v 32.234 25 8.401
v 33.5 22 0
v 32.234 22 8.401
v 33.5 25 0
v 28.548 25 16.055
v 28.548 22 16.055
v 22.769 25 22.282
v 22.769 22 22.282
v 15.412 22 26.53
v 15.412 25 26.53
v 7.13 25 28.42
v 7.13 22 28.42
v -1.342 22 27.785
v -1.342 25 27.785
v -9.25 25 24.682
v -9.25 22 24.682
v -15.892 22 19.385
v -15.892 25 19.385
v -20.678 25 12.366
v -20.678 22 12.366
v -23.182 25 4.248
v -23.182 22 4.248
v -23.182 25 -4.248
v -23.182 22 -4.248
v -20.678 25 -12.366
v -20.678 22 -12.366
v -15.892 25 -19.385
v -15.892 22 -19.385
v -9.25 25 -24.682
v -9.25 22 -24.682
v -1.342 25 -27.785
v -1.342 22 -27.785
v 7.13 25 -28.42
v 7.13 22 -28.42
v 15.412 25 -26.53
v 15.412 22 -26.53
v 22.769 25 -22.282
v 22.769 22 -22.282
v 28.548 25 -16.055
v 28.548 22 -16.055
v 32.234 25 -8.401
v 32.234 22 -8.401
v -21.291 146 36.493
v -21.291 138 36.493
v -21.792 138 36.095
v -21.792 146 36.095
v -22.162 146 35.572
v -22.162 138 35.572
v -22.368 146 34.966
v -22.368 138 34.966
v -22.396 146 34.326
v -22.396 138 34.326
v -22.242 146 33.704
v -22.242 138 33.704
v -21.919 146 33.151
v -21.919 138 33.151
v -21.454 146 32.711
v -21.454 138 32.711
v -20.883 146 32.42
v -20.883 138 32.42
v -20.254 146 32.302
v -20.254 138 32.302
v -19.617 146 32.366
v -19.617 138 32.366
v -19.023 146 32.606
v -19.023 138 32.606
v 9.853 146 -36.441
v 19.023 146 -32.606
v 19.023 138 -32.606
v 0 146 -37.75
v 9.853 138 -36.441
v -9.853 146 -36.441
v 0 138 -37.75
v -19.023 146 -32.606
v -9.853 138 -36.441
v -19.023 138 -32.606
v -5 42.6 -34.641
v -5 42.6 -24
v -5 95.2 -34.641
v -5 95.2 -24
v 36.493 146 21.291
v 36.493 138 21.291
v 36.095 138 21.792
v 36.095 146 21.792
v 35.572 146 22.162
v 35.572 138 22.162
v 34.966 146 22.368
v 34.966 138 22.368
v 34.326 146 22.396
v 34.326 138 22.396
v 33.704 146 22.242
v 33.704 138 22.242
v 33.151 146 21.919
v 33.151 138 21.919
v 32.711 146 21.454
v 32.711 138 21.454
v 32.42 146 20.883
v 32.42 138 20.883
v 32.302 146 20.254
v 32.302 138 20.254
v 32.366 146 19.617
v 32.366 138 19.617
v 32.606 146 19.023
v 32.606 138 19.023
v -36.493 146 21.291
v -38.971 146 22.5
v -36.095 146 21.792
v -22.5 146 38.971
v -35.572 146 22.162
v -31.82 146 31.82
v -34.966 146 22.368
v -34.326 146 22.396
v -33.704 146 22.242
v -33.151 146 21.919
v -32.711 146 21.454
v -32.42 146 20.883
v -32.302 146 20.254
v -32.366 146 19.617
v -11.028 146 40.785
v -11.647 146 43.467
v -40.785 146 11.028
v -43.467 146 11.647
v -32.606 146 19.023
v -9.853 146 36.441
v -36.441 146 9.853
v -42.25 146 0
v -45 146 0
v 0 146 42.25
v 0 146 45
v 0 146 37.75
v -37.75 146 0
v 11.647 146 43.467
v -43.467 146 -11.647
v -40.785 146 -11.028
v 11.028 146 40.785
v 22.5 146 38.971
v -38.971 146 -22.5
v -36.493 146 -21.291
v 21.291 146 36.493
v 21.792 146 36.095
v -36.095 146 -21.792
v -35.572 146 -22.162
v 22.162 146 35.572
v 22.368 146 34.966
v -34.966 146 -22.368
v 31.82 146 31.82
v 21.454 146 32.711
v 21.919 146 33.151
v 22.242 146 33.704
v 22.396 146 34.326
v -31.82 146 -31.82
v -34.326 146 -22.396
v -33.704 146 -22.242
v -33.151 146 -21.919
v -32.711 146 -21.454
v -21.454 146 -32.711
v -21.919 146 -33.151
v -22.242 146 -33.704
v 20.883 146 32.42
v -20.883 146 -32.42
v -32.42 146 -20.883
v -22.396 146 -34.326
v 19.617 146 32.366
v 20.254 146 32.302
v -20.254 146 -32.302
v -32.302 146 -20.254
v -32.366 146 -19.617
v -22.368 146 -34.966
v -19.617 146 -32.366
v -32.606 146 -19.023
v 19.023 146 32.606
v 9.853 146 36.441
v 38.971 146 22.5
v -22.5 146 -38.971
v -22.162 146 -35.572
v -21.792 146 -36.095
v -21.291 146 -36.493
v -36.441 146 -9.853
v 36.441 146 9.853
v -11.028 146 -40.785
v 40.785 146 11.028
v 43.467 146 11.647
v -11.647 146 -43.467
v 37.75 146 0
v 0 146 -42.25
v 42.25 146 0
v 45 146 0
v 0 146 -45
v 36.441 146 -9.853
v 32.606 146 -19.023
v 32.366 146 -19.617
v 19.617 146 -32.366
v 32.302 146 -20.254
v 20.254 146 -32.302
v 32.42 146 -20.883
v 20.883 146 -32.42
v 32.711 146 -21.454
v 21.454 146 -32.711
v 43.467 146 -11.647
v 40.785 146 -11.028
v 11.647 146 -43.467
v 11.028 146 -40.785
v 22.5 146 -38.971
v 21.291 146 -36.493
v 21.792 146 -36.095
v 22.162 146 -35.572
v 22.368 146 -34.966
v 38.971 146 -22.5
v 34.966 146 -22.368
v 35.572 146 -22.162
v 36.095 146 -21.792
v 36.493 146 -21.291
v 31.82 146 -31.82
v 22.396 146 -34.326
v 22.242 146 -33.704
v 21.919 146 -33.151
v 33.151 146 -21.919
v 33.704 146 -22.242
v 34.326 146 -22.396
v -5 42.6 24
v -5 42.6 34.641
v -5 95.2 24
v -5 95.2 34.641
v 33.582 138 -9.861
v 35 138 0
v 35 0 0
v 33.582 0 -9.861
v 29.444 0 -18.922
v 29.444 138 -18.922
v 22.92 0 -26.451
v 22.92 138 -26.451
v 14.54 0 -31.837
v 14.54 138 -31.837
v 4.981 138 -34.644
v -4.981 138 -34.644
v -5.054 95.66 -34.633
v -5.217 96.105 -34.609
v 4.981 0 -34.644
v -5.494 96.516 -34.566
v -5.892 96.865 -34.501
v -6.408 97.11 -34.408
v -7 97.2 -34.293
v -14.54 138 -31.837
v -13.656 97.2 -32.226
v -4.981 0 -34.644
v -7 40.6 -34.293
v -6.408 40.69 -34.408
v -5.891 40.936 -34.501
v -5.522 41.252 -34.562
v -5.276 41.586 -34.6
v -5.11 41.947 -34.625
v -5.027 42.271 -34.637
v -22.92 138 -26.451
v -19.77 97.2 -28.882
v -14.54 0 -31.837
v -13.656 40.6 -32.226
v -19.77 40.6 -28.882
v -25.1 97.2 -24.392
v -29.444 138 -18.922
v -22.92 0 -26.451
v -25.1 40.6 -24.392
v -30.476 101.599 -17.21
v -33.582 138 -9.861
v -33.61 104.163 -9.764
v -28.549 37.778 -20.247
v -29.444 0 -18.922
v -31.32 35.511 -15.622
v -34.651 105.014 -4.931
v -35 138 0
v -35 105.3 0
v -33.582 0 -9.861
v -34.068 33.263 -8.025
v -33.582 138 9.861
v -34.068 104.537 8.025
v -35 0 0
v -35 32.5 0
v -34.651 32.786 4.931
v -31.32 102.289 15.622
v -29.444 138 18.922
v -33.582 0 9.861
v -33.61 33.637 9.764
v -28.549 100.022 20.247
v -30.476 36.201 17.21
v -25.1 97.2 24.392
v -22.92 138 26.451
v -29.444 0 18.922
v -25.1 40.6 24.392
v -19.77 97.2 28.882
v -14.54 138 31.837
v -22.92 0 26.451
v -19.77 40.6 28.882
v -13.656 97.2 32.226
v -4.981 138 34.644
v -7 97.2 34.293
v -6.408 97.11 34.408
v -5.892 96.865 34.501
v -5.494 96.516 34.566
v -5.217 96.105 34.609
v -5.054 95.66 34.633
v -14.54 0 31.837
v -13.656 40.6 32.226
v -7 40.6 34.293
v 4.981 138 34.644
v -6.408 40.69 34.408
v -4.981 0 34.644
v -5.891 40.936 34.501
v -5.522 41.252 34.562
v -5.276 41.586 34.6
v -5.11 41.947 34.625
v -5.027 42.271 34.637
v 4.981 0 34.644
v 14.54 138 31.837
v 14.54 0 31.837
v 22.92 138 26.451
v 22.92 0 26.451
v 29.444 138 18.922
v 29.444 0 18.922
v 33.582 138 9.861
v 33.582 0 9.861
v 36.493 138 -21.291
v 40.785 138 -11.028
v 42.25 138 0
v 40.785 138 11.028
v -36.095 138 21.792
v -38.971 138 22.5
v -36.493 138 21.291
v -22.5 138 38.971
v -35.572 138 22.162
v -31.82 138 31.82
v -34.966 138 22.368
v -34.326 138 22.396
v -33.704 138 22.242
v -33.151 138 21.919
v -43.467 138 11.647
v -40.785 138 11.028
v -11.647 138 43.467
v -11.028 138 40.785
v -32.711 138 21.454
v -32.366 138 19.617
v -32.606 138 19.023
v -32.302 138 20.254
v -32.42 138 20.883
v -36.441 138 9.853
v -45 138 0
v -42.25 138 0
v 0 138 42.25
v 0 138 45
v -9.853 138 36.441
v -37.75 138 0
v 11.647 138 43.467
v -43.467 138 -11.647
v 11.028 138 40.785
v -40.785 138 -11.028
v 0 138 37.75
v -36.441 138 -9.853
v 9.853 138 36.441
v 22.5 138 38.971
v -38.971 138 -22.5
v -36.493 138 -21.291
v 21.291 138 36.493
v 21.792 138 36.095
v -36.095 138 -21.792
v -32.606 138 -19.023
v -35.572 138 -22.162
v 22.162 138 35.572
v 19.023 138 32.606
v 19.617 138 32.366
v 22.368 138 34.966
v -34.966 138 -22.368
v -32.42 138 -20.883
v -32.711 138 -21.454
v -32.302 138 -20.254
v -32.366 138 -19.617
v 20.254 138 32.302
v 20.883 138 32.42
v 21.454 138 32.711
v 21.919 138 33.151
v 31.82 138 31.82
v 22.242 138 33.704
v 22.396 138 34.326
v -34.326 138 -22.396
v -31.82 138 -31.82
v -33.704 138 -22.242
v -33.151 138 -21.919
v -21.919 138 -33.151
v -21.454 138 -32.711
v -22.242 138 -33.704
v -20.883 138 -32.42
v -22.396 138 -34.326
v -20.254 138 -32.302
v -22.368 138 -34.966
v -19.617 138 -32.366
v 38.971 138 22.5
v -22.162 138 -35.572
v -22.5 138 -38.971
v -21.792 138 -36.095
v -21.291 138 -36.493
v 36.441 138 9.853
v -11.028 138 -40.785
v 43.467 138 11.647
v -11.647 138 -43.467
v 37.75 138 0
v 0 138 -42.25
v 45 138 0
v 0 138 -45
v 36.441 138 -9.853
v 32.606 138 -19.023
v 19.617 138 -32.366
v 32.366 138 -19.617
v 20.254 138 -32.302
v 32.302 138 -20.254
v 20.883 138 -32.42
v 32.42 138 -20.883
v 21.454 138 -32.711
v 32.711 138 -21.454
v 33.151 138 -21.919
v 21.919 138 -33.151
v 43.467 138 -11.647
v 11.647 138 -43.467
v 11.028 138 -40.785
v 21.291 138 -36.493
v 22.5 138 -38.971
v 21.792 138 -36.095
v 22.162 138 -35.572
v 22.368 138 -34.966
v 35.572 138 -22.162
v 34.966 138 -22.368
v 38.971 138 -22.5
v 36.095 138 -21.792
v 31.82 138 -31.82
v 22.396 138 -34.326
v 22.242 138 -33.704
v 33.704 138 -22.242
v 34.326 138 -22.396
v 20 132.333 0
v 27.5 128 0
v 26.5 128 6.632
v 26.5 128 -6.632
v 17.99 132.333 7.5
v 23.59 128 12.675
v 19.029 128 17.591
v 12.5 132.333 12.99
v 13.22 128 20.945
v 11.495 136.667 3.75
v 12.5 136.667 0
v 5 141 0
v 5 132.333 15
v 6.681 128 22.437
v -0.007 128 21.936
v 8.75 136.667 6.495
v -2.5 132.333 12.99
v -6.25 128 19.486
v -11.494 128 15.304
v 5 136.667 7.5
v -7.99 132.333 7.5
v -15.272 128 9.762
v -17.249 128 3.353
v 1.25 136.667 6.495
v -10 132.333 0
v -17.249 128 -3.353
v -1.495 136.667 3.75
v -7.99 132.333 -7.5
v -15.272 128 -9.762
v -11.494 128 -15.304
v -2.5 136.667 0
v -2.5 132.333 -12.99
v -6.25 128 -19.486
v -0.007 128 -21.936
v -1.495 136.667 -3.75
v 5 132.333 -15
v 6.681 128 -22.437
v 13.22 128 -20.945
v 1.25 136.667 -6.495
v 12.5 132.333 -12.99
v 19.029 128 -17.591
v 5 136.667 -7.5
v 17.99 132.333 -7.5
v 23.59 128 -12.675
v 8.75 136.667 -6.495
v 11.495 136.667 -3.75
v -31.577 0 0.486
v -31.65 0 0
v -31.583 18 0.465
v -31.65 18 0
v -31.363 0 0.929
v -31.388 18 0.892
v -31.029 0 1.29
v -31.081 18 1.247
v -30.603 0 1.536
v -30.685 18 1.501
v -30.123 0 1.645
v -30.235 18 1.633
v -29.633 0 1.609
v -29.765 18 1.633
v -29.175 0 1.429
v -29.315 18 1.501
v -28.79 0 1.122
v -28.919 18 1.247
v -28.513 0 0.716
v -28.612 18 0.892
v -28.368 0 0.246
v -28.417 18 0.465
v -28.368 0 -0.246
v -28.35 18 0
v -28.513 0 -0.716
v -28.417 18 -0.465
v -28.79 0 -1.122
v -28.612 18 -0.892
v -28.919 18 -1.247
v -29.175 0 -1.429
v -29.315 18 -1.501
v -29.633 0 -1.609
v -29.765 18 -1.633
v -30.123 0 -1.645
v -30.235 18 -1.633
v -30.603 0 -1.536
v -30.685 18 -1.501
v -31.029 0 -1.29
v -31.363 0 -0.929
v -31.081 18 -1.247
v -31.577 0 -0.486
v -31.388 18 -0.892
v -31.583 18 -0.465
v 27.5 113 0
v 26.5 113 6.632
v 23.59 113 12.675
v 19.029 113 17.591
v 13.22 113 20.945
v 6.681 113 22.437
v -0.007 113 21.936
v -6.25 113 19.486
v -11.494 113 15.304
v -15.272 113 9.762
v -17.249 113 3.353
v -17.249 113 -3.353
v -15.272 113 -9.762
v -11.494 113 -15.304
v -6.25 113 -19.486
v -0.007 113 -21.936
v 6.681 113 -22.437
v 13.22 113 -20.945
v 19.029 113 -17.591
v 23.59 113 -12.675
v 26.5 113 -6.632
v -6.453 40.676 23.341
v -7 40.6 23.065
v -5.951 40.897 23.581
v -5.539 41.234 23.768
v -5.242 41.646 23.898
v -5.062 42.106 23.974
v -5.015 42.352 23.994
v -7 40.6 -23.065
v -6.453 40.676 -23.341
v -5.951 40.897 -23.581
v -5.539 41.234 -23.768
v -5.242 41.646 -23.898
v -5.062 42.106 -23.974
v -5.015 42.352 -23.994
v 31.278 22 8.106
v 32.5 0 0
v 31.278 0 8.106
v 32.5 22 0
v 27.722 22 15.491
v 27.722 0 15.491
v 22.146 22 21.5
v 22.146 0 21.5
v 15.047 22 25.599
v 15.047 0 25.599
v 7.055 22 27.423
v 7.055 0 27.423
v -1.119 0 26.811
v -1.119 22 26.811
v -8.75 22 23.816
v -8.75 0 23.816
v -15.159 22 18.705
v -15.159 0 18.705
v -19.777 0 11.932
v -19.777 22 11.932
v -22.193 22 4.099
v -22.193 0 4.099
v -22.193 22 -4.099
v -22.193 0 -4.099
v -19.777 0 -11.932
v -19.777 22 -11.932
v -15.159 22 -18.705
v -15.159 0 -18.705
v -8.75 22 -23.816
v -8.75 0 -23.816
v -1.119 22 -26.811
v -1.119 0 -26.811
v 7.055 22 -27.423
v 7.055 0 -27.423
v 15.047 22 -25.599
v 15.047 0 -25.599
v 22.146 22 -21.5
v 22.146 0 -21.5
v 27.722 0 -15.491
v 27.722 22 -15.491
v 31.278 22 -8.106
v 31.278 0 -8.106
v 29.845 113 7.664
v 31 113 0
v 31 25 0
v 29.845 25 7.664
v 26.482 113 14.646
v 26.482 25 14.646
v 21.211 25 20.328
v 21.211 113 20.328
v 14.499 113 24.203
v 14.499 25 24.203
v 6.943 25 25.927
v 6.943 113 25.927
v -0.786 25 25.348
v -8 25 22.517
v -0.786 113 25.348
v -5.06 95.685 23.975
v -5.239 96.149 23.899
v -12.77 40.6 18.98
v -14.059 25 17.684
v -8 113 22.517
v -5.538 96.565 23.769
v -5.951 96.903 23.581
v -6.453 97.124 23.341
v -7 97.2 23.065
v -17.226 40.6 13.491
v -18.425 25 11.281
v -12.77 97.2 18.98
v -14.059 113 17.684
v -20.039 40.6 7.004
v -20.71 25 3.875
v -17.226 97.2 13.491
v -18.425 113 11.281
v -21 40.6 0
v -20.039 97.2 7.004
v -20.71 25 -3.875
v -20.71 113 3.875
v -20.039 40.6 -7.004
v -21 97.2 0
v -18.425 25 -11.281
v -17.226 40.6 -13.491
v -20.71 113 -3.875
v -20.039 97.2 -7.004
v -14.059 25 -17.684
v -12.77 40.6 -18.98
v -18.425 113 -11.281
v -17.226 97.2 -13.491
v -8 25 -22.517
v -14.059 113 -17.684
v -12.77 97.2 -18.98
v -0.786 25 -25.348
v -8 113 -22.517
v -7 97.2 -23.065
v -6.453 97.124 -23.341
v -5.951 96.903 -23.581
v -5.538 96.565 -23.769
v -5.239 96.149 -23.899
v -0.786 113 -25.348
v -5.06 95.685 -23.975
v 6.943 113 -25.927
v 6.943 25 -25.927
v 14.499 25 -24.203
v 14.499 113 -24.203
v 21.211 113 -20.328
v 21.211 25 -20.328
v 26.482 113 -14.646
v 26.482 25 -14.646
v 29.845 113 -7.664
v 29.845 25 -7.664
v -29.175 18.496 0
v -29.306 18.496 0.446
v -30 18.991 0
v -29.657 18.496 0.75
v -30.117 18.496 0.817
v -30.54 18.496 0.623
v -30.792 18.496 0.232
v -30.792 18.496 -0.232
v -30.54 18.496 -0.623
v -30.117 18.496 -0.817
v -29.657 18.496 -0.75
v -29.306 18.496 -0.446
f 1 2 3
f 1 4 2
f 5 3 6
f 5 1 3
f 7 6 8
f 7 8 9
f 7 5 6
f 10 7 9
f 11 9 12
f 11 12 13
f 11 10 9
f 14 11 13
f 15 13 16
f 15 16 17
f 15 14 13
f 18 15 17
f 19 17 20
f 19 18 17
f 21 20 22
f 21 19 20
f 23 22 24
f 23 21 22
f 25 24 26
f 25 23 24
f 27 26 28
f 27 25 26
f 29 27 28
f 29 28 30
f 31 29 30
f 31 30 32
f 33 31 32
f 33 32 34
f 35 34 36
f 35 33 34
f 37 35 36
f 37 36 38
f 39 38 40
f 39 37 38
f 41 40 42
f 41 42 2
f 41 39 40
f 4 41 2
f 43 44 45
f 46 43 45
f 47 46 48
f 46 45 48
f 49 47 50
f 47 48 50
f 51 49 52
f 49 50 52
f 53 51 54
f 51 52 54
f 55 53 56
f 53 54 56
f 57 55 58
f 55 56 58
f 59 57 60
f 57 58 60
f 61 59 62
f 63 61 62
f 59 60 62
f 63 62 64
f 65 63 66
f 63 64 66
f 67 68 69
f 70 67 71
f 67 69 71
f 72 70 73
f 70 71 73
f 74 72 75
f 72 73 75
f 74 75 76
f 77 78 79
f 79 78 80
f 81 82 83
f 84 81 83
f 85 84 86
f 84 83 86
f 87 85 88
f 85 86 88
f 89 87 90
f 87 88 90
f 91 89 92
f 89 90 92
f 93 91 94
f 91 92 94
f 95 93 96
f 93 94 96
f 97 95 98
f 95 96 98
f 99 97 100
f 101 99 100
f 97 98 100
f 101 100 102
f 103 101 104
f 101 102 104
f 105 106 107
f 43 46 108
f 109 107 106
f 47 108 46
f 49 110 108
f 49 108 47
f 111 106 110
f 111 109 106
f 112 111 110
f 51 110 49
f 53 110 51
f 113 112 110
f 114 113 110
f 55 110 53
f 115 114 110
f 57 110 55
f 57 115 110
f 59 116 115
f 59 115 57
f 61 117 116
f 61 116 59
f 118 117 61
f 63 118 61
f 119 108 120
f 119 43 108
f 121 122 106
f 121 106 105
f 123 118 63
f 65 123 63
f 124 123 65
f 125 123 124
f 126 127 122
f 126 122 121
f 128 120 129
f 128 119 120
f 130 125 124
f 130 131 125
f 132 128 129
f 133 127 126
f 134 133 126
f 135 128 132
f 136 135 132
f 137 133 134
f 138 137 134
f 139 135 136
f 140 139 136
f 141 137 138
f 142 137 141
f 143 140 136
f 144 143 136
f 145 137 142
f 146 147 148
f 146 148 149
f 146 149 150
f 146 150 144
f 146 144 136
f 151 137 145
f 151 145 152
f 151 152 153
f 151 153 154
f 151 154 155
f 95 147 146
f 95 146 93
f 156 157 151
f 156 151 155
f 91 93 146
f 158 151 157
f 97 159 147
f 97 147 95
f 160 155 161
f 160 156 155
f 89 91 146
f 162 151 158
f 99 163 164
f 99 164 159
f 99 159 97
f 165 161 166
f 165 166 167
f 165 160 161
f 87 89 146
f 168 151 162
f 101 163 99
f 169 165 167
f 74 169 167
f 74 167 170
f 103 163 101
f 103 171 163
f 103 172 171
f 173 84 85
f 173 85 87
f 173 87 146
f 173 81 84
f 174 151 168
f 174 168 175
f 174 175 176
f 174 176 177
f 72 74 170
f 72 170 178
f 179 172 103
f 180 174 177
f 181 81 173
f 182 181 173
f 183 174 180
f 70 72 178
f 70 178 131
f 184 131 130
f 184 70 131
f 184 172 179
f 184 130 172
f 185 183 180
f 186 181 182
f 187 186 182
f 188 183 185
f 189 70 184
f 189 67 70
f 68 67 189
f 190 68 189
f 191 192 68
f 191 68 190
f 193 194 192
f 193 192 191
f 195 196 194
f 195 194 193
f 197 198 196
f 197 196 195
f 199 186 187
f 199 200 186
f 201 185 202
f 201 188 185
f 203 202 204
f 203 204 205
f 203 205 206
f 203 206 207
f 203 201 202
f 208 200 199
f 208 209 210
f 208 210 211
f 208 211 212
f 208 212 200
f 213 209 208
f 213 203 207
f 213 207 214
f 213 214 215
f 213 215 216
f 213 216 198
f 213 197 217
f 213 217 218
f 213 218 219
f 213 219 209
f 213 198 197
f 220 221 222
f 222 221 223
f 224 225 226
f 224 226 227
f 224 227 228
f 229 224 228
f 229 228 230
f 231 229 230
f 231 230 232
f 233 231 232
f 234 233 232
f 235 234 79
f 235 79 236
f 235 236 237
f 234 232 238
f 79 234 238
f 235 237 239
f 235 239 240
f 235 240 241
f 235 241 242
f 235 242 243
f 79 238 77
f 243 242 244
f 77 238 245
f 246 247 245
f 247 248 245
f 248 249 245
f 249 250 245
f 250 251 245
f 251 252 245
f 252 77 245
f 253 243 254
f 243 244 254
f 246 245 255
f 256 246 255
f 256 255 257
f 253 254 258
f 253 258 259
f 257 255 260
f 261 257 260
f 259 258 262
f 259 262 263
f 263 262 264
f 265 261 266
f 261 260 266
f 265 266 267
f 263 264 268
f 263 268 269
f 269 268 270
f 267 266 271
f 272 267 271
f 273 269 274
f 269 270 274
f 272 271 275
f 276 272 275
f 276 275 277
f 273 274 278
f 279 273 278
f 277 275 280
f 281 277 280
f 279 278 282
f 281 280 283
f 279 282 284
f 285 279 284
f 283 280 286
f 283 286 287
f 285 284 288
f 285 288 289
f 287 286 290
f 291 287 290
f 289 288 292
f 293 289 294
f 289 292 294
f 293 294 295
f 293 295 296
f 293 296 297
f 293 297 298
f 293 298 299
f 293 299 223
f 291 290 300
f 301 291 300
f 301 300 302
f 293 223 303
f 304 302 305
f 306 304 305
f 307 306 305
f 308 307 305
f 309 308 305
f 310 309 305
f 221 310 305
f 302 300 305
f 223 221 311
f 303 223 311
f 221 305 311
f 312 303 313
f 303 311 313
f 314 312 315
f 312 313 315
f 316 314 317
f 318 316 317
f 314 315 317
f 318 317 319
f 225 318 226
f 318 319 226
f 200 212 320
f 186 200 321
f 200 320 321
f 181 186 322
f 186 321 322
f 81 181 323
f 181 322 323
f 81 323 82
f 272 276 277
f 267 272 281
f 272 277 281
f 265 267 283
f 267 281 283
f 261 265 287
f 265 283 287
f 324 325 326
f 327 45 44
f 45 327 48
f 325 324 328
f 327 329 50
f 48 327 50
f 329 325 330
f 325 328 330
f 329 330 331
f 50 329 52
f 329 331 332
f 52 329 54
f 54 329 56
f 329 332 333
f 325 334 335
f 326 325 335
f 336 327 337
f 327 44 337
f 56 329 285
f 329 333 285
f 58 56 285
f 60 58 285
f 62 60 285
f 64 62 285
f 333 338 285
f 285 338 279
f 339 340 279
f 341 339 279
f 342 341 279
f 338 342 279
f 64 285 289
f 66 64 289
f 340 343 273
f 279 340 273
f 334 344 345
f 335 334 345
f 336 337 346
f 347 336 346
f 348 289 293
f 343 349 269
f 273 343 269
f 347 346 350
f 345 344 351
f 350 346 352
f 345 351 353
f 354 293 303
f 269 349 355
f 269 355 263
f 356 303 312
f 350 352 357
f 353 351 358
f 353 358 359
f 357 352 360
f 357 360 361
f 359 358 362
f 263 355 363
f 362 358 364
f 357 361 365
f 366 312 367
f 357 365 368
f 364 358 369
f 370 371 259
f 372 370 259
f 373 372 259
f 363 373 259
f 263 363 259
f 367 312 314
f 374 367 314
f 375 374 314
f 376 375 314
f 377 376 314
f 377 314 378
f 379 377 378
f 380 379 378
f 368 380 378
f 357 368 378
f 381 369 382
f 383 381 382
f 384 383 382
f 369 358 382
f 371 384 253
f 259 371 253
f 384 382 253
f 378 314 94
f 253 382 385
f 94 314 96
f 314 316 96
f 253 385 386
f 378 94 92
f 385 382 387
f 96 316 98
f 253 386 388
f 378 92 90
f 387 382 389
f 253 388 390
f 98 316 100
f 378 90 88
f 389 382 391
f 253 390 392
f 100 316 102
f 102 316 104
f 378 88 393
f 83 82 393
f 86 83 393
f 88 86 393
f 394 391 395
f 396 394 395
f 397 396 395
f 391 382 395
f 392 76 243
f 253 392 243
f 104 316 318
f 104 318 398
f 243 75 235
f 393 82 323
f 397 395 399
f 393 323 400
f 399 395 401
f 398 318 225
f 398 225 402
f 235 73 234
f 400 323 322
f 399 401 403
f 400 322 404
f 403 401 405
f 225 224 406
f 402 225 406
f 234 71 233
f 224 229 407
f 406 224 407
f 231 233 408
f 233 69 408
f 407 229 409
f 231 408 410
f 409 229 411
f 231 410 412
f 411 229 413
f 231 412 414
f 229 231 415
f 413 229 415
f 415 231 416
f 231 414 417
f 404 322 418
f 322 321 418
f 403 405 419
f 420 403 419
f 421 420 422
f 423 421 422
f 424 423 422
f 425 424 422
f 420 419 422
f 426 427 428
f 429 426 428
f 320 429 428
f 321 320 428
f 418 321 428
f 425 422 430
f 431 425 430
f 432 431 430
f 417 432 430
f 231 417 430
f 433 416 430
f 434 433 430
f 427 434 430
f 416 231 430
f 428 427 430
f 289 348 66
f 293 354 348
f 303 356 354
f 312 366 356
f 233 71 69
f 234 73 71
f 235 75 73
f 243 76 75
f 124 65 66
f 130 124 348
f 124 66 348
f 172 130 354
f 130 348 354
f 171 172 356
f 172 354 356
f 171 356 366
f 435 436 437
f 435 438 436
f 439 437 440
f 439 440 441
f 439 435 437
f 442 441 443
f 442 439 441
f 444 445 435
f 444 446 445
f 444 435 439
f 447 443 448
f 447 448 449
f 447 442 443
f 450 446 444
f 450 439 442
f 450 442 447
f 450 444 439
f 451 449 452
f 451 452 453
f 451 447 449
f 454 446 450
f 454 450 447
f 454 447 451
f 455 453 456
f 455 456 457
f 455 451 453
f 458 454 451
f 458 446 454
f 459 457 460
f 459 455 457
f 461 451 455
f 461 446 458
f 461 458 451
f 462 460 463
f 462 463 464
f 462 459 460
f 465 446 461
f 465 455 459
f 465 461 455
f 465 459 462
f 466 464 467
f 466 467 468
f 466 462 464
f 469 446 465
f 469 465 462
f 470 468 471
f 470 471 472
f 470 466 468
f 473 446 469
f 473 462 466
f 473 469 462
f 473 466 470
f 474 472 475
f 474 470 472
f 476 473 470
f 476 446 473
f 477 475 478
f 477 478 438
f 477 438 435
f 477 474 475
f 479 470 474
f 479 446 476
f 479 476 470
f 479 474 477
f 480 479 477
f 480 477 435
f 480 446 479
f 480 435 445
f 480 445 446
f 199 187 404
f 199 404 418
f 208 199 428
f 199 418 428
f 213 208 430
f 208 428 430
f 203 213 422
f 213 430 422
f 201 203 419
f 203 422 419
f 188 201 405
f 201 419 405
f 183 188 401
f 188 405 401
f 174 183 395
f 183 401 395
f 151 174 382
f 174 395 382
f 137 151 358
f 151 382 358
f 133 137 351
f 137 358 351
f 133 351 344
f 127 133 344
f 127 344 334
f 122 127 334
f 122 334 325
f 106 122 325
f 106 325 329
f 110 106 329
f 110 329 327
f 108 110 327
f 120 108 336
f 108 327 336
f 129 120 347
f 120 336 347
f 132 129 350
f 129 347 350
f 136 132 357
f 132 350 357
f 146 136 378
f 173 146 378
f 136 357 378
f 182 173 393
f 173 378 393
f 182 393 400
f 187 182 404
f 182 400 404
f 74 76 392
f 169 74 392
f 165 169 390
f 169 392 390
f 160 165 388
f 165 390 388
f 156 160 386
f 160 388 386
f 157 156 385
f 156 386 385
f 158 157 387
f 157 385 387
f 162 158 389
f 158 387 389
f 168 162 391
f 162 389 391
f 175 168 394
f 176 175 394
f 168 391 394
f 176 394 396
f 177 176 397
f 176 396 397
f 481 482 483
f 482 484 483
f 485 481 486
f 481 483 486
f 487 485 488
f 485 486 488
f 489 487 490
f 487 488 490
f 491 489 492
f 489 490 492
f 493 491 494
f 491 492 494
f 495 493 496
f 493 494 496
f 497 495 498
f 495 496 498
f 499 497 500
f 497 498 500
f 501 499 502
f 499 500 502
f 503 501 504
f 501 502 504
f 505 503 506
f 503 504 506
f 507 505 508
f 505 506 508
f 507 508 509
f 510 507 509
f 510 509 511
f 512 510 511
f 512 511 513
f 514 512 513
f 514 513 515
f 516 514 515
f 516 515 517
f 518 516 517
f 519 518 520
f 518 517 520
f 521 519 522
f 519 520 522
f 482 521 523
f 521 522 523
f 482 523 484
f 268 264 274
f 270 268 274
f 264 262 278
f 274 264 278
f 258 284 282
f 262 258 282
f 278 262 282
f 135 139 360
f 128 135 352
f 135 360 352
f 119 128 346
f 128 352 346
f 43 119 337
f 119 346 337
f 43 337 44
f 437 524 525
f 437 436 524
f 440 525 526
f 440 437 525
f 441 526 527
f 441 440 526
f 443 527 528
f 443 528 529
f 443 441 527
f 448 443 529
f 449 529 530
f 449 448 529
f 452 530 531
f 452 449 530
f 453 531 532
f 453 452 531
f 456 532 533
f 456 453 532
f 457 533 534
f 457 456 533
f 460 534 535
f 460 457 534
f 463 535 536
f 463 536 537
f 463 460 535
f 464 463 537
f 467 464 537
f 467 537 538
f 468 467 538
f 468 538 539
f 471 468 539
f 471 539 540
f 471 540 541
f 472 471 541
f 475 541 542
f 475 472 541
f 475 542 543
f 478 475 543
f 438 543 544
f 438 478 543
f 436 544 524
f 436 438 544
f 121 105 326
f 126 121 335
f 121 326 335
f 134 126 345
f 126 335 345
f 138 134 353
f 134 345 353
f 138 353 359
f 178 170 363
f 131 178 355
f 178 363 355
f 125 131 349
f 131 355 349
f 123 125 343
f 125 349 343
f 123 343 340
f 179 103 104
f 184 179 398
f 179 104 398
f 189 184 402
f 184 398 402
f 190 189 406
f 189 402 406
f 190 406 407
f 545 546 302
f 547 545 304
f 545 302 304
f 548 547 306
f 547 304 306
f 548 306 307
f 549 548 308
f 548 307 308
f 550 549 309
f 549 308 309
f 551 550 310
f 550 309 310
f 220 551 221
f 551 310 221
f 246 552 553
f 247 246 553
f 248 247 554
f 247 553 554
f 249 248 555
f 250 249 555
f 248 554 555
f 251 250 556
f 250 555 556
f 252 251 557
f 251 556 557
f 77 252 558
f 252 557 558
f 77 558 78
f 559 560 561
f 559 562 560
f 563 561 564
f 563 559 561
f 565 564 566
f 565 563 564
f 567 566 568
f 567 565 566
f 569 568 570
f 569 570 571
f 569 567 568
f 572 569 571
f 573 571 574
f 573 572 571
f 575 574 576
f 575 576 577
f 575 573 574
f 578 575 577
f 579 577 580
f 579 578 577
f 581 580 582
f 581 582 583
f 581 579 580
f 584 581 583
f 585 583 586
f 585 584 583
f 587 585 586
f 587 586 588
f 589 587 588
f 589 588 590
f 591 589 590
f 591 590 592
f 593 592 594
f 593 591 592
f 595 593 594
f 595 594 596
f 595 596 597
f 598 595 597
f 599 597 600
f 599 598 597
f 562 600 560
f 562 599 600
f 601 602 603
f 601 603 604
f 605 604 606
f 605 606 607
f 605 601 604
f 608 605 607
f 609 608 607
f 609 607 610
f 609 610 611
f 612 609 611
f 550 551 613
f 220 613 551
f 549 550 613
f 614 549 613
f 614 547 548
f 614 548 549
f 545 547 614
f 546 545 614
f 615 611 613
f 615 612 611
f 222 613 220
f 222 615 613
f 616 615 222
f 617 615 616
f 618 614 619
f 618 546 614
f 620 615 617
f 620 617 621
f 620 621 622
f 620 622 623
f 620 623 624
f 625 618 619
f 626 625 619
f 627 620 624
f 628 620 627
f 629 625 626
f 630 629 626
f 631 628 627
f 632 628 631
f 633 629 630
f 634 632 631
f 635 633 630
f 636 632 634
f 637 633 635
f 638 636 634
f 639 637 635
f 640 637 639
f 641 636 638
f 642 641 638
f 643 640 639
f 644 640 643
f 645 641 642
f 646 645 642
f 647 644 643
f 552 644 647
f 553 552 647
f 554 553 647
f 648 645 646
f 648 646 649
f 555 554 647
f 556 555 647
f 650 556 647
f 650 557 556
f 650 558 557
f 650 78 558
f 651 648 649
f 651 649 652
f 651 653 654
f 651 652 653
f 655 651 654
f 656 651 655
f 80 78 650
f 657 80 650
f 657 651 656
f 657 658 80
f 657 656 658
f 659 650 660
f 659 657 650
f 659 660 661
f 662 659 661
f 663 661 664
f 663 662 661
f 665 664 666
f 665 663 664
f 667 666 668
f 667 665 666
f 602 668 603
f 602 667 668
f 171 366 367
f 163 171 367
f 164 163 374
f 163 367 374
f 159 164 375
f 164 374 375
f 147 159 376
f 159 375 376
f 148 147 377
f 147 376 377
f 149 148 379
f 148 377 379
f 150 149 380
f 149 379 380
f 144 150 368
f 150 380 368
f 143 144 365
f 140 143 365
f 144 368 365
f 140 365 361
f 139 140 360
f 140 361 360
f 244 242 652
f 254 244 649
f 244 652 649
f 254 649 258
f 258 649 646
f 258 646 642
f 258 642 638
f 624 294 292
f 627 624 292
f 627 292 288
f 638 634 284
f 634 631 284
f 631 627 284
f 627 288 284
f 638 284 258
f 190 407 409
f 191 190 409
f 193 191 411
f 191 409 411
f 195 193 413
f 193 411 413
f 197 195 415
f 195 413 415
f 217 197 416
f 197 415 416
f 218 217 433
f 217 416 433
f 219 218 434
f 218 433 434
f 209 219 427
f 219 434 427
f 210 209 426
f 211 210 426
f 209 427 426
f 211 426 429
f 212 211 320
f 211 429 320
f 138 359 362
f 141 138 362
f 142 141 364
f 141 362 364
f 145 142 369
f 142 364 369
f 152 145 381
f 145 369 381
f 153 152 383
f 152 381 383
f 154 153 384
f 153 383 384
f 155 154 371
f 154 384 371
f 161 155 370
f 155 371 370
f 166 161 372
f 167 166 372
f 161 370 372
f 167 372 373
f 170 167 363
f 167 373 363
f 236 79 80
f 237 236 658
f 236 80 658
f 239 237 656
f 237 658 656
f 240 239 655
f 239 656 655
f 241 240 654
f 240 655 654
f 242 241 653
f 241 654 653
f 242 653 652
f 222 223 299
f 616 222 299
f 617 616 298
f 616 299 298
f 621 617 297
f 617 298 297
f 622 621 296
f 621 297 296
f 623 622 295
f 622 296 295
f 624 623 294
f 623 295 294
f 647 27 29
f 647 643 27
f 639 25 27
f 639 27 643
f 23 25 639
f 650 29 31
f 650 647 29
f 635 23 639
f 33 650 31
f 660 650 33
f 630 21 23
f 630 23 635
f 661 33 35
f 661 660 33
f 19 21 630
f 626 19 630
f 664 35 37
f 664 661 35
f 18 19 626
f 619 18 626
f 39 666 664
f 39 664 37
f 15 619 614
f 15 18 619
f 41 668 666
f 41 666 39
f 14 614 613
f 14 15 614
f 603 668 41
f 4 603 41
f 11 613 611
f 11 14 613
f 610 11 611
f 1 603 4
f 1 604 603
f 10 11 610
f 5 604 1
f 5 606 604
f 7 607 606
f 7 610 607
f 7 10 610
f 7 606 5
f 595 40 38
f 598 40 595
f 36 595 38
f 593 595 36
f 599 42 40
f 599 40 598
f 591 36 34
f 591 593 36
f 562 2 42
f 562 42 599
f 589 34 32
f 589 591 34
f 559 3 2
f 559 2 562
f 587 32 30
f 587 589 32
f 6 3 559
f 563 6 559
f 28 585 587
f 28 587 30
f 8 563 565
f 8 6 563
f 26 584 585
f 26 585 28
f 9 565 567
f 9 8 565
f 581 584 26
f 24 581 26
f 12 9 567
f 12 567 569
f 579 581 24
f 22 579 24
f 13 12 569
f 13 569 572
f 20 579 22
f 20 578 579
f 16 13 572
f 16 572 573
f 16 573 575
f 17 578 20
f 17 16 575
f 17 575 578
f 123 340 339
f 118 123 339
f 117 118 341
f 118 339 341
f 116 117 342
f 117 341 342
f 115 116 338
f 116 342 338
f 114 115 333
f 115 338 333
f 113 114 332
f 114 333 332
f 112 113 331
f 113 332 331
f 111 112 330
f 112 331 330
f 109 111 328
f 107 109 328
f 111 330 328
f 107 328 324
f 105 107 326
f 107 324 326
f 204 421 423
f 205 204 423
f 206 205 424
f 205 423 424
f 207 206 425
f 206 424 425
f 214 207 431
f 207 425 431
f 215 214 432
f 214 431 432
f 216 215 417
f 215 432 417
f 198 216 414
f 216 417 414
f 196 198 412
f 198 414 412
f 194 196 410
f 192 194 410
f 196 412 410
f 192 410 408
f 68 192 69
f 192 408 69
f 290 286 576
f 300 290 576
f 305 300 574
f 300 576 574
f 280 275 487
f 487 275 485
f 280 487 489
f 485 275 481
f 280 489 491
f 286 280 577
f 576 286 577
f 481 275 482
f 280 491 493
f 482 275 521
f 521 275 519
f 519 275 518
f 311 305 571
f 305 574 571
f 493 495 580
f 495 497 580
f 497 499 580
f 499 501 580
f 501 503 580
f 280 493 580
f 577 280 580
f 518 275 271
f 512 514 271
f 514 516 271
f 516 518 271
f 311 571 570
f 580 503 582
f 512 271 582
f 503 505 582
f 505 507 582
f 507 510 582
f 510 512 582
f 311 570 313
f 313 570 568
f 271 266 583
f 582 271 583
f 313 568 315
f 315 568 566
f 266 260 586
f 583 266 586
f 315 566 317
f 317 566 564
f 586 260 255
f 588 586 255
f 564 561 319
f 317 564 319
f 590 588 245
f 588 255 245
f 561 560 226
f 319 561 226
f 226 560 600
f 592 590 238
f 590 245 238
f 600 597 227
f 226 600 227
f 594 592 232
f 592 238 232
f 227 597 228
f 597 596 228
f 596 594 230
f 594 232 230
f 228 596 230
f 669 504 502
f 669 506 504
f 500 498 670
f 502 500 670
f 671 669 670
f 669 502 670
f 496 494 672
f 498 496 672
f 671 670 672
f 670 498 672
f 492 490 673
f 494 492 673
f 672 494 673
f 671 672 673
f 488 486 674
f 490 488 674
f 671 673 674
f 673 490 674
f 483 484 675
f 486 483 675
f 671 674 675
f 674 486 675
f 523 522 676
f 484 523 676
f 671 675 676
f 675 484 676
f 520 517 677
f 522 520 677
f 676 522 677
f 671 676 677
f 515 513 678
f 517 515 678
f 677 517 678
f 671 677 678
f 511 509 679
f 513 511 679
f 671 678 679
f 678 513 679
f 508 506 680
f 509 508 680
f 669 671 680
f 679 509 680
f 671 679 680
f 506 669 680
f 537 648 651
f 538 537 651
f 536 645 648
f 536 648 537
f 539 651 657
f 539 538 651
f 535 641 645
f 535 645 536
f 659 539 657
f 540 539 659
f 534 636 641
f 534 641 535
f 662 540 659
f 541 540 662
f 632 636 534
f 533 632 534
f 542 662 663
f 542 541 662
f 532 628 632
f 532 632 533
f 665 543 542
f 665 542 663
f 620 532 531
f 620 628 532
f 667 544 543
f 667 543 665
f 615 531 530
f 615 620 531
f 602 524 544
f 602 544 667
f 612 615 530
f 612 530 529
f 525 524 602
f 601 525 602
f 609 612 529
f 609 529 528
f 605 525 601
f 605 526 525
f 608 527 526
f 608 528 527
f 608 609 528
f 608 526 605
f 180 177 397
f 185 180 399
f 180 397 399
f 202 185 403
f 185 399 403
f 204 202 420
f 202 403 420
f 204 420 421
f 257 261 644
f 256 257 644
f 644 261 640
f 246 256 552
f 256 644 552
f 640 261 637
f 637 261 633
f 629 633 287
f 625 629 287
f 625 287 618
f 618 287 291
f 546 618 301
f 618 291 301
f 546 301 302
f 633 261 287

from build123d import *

# Parameters (mm, degrees)
CROQUIS1_R                = 35
SALIENTE_EXTRUIR1_DEPTH   = 138
CROQUIS2_R                = 45
SALIENTE_EXTRUIR2_DEPTH   = 8
CORTAR_EXTRUIR1_DEPTH     = 83.5
CORTAR_EXTRUIR2_DEPTH     = 167
TALADRO_ROSCADO_M41_D     = 3.3
TALADRO_ROSCADO_M41_DEPTH = 18
TALADRO_ROSCADO_M41_TIP   = 0.991420021


with BuildPart() as part:
    # Croquis1 → Saliente-Extruir1 (new body)
    with BuildSketch(Plane(origin=(0, 0, 0), x_dir=(1, 0, 0), z_dir=(0, 1, 0))):
        Circle(CROQUIS1_R)
    extrude(amount=SALIENTE_EXTRUIR1_DEPTH)

    # Croquis2 → Saliente-Extruir2 (add)
    with BuildSketch(Plane(origin=(0, 138, 0), x_dir=(1, 0, 0), z_dir=(0, 1, 0))):
        Circle(CROQUIS2_R)
    extrude(amount=SALIENTE_EXTRUIR2_DEPTH)

    # Croquis3 → Cortar-Revolución1 (revolve, cut)
    with BuildSketch(Plane.XY):
        Polygon((5, 0), (32.5, 0), (32.5, 22), (33.5, 22), (33.5, 25), (31, 25), (31, 113), (27.5, 113), (27.5, 128), (5, 141), align=None)
    revolve(axis=Axis((5, 141, 0), (0, -1, 0)), mode=Mode.SUBTRACT)

    # Croquis4 → Cortar-Extruir1 (cut, symmetric)
    with BuildSketch(Plane.XY):
        with BuildLine():
            Line((-35, 32.5), (-25.1, 40.6))
            Line((-25.1, 40.6), (-7, 40.6))
            ThreePointArc((-7, 40.6), (-5.585786438, 41.185786438), (-5, 42.6))
            Line((-5, 42.6), (-5, 95.2))
            ThreePointArc((-5, 95.2), (-5.585786438, 96.614213562), (-7, 97.2))
            Line((-7, 97.2), (-25.1, 97.2))
            Line((-25.1, 97.2), (-35, 105.3))
            Line((-35, 105.3), (-45, 105.3))
            Line((-45, 105.3), (-45, 32.5))
            Line((-45, 32.5), (-35, 32.5))
        make_face()
    extrude(amount=CORTAR_EXTRUIR1_DEPTH, both=True, mode=Mode.SUBTRACT)

    # Croquis5 → Cortar-Extruir2 (cut)
    with BuildSketch(Plane.XZ.offset(-138)):
        with BuildLine():
            ThreePointArc((-21.290820143, -36.493334702), (0, -42.25), (21.290820143, -36.493334702))
            ThreePointArc((21.290820143, -36.493334702), (22.10042151, -33.416072018), (19.023158826, -32.606470651))
            ThreePointArc((19.023158826, -32.606470651), (0, -37.75), (-19.023158826, -32.606470651))
            ThreePointArc((-19.023158826, -32.606470651), (-22.10042151, -33.416072018), (-21.290820143, -36.493334702))
        make_face()
        with BuildLine():
            ThreePointArc((36.493334702, -21.290820143), (42.25, 0), (36.493334702, 21.290820143))
            ThreePointArc((36.493334702, 21.290820143), (33.416072018, 22.10042151), (32.606470651, 19.023158826))
            ThreePointArc((32.606470651, 19.023158826), (37.75, 0), (32.606470651, -19.023158826))
            ThreePointArc((32.606470651, -19.023158826), (33.416072018, -22.10042151), (36.493334702, -21.290820143))
        make_face()
        with BuildLine():
            ThreePointArc((21.290820143, 36.493334702), (0, 42.25), (-21.290820143, 36.493334702))
            ThreePointArc((-21.290820143, 36.493334702), (-22.10042151, 33.416072018), (-19.023158826, 32.606470651))
            ThreePointArc((-19.023158826, 32.606470651), (0, 37.75), (19.023158826, 32.606470651))
            ThreePointArc((19.023158826, 32.606470651), (22.10042151, 33.416072018), (21.290820143, 36.493334702))
        make_face()
        with BuildLine():
            ThreePointArc((-36.493334702, 21.290820143), (-42.25, 0), (-36.493334702, -21.290820143))
            ThreePointArc((-36.493334702, -21.290820143), (-33.416072018, -22.10042151), (-32.606470651, -19.023158826))
            ThreePointArc((-32.606470651, -19.023158826), (-37.75, 0), (-32.606470651, 19.023158826))
            ThreePointArc((-32.606470651, 19.023158826), (-33.416072018, 22.10042151), (-36.493334702, 21.290820143))
        make_face()
    extrude(amount=-CORTAR_EXTRUIR2_DEPTH, mode=Mode.SUBTRACT)

    # Taladro roscado M41
    with Locations(Plane.XZ):
        with Locations((-30, 0)):
            Hole(TALADRO_ROSCADO_M41_D / 2, depth=TALADRO_ROSCADO_M41_DEPTH)
            with Locations((0, 0, -(TALADRO_ROSCADO_M41_DEPTH + TALADRO_ROSCADO_M41_TIP / 2))):  # 118° drill point
                Cone(0, TALADRO_ROSCADO_M41_D / 2, TALADRO_ROSCADO_M41_TIP, mode=Mode.SUBTRACT)


solid = part.part
